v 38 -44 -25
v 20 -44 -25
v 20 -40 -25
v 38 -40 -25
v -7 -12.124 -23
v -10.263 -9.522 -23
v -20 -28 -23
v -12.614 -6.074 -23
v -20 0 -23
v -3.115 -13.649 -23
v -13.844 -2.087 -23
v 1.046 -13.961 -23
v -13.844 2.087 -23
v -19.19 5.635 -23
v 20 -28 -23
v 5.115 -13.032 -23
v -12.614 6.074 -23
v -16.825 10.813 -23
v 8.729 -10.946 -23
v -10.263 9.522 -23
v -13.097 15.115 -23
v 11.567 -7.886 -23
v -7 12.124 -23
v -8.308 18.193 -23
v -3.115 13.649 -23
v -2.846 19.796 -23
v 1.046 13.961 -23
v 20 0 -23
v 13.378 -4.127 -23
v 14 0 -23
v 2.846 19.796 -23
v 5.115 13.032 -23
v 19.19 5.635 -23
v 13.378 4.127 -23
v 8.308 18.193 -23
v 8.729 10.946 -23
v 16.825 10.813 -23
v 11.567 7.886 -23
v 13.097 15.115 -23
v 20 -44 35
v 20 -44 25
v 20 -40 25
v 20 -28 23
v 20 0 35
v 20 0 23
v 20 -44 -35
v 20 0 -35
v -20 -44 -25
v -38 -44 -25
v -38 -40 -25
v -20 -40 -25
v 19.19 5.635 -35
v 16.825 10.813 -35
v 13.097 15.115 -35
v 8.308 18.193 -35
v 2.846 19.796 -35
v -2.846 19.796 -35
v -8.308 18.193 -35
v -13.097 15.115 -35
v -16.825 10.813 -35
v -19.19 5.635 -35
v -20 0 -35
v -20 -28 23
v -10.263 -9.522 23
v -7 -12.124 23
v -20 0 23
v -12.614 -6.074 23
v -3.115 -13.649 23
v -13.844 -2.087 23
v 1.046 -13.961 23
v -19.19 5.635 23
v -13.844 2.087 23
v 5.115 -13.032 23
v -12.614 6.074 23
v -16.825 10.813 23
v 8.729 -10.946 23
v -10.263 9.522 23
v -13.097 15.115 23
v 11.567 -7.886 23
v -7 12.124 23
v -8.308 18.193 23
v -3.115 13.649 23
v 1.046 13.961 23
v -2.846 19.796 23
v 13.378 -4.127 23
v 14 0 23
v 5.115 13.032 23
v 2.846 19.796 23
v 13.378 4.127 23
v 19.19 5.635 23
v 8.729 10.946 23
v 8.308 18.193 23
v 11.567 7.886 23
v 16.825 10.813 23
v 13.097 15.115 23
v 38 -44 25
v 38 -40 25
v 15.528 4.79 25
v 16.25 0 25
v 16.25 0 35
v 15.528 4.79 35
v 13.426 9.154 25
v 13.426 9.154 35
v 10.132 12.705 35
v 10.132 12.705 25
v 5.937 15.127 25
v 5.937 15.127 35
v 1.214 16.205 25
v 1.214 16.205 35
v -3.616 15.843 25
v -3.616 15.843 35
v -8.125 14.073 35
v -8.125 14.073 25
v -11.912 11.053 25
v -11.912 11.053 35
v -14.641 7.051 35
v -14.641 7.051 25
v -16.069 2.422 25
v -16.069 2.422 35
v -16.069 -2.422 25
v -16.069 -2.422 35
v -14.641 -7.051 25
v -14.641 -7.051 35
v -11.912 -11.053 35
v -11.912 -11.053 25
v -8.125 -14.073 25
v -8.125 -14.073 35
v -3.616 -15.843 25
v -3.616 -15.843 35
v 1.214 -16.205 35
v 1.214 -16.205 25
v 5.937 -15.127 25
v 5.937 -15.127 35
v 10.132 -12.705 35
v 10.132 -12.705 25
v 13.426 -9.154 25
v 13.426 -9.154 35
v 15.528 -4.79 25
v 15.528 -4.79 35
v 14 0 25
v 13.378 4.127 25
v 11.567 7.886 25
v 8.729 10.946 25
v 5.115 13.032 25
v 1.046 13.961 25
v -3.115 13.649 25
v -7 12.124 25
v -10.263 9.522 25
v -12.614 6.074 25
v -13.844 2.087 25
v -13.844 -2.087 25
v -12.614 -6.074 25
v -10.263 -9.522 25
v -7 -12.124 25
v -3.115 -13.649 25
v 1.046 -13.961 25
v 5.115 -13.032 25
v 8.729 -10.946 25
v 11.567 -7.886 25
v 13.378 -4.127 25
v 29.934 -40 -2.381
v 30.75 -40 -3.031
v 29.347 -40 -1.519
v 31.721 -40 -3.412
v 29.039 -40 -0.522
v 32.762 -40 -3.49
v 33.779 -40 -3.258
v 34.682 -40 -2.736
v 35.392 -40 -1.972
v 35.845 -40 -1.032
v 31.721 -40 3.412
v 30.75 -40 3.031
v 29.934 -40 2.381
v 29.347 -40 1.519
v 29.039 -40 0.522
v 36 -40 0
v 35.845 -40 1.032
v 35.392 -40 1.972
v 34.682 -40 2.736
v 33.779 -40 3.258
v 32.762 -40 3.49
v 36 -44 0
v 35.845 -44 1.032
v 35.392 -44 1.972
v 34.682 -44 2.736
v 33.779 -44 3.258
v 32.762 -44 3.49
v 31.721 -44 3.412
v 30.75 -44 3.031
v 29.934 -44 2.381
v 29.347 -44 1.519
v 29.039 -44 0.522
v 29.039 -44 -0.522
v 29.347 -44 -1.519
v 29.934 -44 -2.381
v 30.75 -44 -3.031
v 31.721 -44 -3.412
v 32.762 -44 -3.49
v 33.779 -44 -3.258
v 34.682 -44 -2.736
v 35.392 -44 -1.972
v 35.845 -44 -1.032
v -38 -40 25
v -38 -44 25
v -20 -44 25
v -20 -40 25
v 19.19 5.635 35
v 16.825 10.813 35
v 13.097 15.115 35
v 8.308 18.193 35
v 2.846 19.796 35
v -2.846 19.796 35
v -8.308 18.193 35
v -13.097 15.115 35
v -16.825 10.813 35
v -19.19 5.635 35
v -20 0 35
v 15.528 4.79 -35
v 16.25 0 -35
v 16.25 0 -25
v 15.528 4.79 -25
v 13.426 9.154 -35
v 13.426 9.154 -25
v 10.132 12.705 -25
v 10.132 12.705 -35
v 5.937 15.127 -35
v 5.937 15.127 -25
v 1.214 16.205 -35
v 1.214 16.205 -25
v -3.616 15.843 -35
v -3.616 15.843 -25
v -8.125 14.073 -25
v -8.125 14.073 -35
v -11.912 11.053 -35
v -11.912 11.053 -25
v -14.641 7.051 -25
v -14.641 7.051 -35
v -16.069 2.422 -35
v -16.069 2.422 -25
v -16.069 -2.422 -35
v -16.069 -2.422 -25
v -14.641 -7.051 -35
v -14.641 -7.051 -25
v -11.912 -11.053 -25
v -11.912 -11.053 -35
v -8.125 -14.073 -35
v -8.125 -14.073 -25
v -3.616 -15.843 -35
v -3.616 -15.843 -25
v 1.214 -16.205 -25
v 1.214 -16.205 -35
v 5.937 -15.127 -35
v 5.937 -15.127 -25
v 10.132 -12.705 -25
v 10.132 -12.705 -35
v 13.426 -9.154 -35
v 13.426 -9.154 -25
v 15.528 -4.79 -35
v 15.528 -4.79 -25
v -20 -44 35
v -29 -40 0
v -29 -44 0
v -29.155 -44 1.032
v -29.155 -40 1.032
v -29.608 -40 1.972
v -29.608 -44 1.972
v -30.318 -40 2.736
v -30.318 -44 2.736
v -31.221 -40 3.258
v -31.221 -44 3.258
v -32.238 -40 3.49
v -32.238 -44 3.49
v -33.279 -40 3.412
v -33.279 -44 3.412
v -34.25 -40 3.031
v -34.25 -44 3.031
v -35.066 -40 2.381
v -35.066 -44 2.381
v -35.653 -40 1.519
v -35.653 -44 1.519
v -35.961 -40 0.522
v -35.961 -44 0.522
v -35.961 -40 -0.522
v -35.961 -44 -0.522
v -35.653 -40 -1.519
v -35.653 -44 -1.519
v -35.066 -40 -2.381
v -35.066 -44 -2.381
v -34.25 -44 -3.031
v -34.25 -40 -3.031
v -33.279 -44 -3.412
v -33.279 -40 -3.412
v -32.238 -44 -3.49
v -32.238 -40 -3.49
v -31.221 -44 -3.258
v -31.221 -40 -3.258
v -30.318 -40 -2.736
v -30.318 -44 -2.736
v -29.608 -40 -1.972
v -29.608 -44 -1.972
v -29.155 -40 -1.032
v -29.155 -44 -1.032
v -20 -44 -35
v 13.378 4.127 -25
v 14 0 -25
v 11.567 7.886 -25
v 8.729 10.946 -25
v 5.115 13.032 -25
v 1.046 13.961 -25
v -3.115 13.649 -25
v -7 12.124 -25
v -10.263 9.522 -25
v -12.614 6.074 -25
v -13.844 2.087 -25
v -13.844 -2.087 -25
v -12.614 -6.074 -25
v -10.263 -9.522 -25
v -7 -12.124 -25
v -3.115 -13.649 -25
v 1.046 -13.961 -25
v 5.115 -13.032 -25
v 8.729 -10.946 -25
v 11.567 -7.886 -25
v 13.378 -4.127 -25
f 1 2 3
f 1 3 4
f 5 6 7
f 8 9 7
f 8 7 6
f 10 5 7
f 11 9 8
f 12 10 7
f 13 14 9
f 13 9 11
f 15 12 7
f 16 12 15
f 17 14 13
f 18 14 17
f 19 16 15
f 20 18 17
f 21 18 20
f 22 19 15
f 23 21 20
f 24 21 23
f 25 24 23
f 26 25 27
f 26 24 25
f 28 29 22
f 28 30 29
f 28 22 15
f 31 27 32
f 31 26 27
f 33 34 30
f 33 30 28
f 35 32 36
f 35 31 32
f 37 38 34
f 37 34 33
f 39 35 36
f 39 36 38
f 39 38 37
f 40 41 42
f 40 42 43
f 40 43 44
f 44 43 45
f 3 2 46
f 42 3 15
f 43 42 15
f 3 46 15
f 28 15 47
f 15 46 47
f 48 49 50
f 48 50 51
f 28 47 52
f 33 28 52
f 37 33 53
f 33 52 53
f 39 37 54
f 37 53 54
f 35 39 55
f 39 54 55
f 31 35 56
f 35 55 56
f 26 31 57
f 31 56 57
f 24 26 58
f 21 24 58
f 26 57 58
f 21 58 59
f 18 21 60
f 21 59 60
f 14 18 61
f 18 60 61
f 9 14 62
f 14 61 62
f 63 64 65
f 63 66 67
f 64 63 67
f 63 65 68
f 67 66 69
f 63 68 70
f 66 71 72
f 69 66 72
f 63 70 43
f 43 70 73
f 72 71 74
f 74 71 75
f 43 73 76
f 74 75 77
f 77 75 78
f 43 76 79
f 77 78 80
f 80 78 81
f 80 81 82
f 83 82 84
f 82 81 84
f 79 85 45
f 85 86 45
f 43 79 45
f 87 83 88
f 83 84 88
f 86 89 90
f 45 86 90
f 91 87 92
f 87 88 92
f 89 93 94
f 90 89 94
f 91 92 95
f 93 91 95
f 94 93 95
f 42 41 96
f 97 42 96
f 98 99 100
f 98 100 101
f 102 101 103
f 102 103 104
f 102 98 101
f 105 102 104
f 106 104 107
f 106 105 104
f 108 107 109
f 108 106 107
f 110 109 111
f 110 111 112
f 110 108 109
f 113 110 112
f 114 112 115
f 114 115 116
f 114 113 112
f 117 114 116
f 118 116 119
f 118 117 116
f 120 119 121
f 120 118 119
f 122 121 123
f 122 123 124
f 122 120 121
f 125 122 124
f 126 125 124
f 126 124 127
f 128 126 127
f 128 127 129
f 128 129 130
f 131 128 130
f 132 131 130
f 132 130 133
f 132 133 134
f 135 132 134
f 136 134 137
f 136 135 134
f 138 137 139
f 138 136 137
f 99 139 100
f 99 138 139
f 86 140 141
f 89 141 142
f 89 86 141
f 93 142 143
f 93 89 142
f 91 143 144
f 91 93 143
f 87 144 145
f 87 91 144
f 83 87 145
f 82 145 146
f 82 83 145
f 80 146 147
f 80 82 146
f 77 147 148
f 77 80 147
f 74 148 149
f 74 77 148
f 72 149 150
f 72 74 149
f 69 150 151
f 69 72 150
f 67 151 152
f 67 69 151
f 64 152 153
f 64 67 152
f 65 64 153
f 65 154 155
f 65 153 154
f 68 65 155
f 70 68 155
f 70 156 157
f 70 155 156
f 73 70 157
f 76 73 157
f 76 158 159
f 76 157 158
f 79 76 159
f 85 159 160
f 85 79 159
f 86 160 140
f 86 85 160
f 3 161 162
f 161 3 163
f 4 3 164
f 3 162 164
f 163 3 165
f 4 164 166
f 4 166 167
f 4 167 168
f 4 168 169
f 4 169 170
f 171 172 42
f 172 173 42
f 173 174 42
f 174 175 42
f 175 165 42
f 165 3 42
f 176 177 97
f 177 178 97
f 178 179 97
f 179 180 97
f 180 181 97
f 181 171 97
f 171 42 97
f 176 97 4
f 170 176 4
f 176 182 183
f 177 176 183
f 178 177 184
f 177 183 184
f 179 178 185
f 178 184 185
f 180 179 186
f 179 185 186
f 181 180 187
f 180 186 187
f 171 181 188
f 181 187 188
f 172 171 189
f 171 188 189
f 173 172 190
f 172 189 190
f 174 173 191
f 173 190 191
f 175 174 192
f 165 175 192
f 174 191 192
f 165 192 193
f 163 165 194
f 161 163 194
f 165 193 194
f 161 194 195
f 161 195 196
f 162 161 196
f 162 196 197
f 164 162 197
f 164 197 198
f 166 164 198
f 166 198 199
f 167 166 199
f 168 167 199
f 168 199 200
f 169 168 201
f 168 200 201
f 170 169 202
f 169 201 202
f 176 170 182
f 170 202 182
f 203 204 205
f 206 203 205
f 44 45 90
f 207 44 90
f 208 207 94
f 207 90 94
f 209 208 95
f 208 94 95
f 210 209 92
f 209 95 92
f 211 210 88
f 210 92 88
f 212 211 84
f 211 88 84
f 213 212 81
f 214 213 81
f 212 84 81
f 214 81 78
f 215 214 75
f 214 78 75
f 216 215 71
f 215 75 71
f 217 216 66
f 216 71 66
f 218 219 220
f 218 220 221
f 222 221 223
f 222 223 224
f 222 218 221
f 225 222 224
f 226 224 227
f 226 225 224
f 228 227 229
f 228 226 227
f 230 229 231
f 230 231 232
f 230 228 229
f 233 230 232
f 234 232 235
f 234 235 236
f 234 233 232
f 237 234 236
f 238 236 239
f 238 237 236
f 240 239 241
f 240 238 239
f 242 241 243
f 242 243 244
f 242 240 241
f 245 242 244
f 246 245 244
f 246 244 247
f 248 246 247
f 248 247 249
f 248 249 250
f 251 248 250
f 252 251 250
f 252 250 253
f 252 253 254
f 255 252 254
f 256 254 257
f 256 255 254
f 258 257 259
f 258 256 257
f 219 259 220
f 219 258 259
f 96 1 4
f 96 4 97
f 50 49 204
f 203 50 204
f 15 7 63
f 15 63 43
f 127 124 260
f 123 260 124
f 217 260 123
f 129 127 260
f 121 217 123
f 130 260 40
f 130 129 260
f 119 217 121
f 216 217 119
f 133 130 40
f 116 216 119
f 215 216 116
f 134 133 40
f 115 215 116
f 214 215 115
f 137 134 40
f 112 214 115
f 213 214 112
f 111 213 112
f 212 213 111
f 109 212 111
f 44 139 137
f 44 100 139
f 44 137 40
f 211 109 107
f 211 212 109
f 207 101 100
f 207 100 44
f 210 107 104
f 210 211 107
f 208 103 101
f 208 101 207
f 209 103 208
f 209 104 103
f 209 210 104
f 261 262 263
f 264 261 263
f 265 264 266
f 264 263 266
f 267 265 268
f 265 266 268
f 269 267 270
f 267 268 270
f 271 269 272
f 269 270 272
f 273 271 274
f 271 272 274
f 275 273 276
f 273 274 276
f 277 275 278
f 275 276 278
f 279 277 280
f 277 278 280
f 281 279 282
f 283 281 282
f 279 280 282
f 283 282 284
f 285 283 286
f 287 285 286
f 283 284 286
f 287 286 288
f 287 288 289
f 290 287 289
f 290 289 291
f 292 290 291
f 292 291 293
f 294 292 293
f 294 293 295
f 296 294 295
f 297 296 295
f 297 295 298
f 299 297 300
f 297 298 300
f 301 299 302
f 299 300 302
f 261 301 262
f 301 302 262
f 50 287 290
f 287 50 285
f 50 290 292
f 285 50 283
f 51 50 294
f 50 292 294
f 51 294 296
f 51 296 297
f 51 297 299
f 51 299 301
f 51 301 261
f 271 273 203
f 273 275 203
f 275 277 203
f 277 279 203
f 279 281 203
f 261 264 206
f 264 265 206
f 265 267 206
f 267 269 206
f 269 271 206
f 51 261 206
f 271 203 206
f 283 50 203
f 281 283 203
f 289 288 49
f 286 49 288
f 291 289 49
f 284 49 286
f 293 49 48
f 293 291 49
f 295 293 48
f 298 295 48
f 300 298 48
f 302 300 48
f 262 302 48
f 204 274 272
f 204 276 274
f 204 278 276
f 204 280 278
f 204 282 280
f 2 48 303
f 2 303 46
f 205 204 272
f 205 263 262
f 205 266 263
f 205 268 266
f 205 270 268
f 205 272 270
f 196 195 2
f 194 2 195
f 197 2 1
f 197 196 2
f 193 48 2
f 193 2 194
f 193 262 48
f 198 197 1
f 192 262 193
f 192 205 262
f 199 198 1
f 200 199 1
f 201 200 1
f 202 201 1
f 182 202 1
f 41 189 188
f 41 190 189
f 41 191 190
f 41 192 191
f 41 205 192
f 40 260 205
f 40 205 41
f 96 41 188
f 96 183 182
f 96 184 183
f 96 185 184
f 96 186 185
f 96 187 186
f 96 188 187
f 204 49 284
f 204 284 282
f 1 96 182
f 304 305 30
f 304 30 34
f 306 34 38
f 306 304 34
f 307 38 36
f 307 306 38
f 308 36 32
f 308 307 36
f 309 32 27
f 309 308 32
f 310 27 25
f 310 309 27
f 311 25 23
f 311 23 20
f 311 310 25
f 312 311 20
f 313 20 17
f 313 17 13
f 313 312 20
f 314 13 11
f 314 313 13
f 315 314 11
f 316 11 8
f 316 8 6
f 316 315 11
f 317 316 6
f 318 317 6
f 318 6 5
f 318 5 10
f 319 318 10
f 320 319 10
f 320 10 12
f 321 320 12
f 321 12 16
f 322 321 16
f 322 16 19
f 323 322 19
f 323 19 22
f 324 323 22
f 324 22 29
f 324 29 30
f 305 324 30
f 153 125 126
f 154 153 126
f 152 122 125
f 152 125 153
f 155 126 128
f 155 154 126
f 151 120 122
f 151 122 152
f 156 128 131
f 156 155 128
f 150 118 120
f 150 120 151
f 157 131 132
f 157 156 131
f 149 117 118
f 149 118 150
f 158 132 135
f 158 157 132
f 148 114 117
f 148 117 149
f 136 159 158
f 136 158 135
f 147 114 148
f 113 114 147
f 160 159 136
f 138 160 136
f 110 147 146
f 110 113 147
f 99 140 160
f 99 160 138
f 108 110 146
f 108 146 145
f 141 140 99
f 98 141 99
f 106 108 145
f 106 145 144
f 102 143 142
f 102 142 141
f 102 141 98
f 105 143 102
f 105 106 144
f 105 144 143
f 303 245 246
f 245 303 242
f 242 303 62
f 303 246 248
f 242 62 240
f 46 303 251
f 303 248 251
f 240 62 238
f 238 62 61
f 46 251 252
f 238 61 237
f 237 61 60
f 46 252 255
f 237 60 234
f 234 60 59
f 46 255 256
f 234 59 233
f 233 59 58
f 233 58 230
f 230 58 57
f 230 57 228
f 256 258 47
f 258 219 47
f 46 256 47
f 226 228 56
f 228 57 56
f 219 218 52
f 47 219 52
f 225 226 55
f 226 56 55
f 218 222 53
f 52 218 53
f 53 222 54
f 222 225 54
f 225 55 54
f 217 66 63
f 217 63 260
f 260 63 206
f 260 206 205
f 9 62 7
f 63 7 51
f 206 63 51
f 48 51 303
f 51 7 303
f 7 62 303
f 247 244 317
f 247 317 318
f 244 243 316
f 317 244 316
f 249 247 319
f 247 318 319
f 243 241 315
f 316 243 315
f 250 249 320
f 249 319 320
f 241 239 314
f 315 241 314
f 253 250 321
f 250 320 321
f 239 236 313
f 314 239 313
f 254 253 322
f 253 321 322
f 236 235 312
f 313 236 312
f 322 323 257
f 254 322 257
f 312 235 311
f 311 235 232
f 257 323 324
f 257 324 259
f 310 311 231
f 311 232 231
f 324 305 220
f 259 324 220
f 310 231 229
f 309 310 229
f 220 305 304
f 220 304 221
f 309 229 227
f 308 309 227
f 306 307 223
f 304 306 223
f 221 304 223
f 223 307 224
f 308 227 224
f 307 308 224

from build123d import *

# Parameters (mm, degrees)
SKETCH002_AS_DRAWN_W                 = 76
SKETCH002_AS_DRAWN_H                 = 50
SKETCH002_AS_DRAWN_R                 = 3.5
EXTRUDE003_DEPTH                     = 4
EXTRUDE003_ONTO_SKETCH002_ROLL_ANGLE = 90
CYLINDER_R                           = 16.25
CYLINDER_DEPTH                       = 10
SKETCH_R                             = 14
EXTRUDE001_DEPTH                     = 12
CYLINDER001_R                        = 16.25
CYLINDER001_DEPTH                    = 10
EXTRUDE_DEPTH                        = 12
SKETCH001_AS_DRAWN_W                 = 40
SKETCH001_AS_DRAWN_H                 = 70
EXTRUDE002_DEPTH                     = 16
EXTRUDE002_ONTO_SKETCH001_ROLL_ANGLE = 90


with BuildPart() as extrude003:
    # Sketch002 as drawn → Extrude003 (new)
    with BuildSketch(Plane.XY):
        Rectangle(SKETCH002_AS_DRAWN_W, SKETCH002_AS_DRAWN_H)
        with Locations((-32.5, 0)):
            Circle(SKETCH002_AS_DRAWN_R, mode=Mode.SUBTRACT)
        with Locations((32.5, 0)):
            Circle(SKETCH002_AS_DRAWN_R, mode=Mode.SUBTRACT)
    extrude(amount=-EXTRUDE003_DEPTH)


with BuildPart() as extrude003_1:
    # Extrude003 onto Sketch002 roll: moved
    add(extrude003.part.rotate(Axis((0, 0, 0), (1, 0, 0)), EXTRUDE003_ONTO_SKETCH002_ROLL_ANGLE))


with BuildPart() as extrude003_2:
    # Extrude003 onto Sketch002 placement: moved
    add(extrude003_1.part)


with BuildPart() as extrude003_3:
    # Extrude003 placement: moved
    add(extrude003_2.part.moved(Location((0, -44, 0))))


with BuildPart() as cylinder:
    # Cylinder → Cylinder (new body)
    with BuildSketch(Plane.XY):
        Circle(CYLINDER_R)
    extrude(amount=CYLINDER_DEPTH)


with BuildPart() as barin_nest_l_cut:
    # Sketch → Extrude001 (new body)
    with BuildSketch(Plane.XY):
        with BuildLine():
            ThreePointArc((20, 0), (0, 20), (-20, 0))
            Line((-20, 0), (-20, -40))
            Line((-20, -40), (20, -40))
            Line((20, -40), (20, 0))
        make_face()
        Circle(SKETCH_R, mode=Mode.SUBTRACT)
    extrude(amount=EXTRUDE001_DEPTH)

    # Cut: cut Cylinder
    add(cylinder.part, mode=Mode.SUBTRACT)


with BuildPart() as barin_nest_l_cut_1:
    # Cut placement: moved
    add(barin_nest_l_cut.part.moved(Location((0, 0, -35))))


with BuildPart() as cylinder001:
    # Cylinder001 → Cylinder001 (new body)
    with BuildSketch(Plane.XY.offset(2)):
        Circle(CYLINDER001_R)
    extrude(amount=CYLINDER001_DEPTH)


with BuildPart() as bearing_nest_r_cut:
    # Sketch → Extrude (new body)
    with BuildSketch(Plane.XY):
        with BuildLine():
            ThreePointArc((20, 0), (0, 20), (-20, 0))
            Line((-20, 0), (-20, -40))
            Line((-20, -40), (20, -40))
            Line((20, -40), (20, 0))
        make_face()
        Circle(SKETCH_R, mode=Mode.SUBTRACT)
    extrude(amount=EXTRUDE_DEPTH)

    # Cut001: cut Cylinder001
    add(cylinder001.part, mode=Mode.SUBTRACT)


with BuildPart() as bearing_nest_r_cut_1:
    # Cut001 placement: moved
    add(bearing_nest_r_cut.part.moved(Location((0, 0, 23))))


with BuildPart() as fusion:
    # Sketch001 as drawn → Extrude002 (new)
    with BuildSketch(Plane.XY):
        Rectangle(SKETCH001_AS_DRAWN_W, SKETCH001_AS_DRAWN_H)
    extrude(amount=-EXTRUDE002_DEPTH)


with BuildPart() as fusion_1:
    # Extrude002 onto Sketch001 roll: moved
    add(fusion.part.rotate(Axis((0, 0, 0), (1, 0, 0)), EXTRUDE002_ONTO_SKETCH001_ROLL_ANGLE))


with BuildPart() as fusion_2:
    # Extrude002 onto Sketch001 placement: moved
    add(fusion_1.part)


with BuildPart() as fusion_3:
    # Extrude002 placement: moved
    add(fusion_2.part.moved(Location((0, -44, 0))))

    # Fusion: union Extrude003, barin-nest-l-cut, bearing-nest-r-cut
    add(extrude003_3.part)
    add(barin_nest_l_cut_1.part)
    add(bearing_nest_r_cut_1.part)


solid = fusion_3.part
